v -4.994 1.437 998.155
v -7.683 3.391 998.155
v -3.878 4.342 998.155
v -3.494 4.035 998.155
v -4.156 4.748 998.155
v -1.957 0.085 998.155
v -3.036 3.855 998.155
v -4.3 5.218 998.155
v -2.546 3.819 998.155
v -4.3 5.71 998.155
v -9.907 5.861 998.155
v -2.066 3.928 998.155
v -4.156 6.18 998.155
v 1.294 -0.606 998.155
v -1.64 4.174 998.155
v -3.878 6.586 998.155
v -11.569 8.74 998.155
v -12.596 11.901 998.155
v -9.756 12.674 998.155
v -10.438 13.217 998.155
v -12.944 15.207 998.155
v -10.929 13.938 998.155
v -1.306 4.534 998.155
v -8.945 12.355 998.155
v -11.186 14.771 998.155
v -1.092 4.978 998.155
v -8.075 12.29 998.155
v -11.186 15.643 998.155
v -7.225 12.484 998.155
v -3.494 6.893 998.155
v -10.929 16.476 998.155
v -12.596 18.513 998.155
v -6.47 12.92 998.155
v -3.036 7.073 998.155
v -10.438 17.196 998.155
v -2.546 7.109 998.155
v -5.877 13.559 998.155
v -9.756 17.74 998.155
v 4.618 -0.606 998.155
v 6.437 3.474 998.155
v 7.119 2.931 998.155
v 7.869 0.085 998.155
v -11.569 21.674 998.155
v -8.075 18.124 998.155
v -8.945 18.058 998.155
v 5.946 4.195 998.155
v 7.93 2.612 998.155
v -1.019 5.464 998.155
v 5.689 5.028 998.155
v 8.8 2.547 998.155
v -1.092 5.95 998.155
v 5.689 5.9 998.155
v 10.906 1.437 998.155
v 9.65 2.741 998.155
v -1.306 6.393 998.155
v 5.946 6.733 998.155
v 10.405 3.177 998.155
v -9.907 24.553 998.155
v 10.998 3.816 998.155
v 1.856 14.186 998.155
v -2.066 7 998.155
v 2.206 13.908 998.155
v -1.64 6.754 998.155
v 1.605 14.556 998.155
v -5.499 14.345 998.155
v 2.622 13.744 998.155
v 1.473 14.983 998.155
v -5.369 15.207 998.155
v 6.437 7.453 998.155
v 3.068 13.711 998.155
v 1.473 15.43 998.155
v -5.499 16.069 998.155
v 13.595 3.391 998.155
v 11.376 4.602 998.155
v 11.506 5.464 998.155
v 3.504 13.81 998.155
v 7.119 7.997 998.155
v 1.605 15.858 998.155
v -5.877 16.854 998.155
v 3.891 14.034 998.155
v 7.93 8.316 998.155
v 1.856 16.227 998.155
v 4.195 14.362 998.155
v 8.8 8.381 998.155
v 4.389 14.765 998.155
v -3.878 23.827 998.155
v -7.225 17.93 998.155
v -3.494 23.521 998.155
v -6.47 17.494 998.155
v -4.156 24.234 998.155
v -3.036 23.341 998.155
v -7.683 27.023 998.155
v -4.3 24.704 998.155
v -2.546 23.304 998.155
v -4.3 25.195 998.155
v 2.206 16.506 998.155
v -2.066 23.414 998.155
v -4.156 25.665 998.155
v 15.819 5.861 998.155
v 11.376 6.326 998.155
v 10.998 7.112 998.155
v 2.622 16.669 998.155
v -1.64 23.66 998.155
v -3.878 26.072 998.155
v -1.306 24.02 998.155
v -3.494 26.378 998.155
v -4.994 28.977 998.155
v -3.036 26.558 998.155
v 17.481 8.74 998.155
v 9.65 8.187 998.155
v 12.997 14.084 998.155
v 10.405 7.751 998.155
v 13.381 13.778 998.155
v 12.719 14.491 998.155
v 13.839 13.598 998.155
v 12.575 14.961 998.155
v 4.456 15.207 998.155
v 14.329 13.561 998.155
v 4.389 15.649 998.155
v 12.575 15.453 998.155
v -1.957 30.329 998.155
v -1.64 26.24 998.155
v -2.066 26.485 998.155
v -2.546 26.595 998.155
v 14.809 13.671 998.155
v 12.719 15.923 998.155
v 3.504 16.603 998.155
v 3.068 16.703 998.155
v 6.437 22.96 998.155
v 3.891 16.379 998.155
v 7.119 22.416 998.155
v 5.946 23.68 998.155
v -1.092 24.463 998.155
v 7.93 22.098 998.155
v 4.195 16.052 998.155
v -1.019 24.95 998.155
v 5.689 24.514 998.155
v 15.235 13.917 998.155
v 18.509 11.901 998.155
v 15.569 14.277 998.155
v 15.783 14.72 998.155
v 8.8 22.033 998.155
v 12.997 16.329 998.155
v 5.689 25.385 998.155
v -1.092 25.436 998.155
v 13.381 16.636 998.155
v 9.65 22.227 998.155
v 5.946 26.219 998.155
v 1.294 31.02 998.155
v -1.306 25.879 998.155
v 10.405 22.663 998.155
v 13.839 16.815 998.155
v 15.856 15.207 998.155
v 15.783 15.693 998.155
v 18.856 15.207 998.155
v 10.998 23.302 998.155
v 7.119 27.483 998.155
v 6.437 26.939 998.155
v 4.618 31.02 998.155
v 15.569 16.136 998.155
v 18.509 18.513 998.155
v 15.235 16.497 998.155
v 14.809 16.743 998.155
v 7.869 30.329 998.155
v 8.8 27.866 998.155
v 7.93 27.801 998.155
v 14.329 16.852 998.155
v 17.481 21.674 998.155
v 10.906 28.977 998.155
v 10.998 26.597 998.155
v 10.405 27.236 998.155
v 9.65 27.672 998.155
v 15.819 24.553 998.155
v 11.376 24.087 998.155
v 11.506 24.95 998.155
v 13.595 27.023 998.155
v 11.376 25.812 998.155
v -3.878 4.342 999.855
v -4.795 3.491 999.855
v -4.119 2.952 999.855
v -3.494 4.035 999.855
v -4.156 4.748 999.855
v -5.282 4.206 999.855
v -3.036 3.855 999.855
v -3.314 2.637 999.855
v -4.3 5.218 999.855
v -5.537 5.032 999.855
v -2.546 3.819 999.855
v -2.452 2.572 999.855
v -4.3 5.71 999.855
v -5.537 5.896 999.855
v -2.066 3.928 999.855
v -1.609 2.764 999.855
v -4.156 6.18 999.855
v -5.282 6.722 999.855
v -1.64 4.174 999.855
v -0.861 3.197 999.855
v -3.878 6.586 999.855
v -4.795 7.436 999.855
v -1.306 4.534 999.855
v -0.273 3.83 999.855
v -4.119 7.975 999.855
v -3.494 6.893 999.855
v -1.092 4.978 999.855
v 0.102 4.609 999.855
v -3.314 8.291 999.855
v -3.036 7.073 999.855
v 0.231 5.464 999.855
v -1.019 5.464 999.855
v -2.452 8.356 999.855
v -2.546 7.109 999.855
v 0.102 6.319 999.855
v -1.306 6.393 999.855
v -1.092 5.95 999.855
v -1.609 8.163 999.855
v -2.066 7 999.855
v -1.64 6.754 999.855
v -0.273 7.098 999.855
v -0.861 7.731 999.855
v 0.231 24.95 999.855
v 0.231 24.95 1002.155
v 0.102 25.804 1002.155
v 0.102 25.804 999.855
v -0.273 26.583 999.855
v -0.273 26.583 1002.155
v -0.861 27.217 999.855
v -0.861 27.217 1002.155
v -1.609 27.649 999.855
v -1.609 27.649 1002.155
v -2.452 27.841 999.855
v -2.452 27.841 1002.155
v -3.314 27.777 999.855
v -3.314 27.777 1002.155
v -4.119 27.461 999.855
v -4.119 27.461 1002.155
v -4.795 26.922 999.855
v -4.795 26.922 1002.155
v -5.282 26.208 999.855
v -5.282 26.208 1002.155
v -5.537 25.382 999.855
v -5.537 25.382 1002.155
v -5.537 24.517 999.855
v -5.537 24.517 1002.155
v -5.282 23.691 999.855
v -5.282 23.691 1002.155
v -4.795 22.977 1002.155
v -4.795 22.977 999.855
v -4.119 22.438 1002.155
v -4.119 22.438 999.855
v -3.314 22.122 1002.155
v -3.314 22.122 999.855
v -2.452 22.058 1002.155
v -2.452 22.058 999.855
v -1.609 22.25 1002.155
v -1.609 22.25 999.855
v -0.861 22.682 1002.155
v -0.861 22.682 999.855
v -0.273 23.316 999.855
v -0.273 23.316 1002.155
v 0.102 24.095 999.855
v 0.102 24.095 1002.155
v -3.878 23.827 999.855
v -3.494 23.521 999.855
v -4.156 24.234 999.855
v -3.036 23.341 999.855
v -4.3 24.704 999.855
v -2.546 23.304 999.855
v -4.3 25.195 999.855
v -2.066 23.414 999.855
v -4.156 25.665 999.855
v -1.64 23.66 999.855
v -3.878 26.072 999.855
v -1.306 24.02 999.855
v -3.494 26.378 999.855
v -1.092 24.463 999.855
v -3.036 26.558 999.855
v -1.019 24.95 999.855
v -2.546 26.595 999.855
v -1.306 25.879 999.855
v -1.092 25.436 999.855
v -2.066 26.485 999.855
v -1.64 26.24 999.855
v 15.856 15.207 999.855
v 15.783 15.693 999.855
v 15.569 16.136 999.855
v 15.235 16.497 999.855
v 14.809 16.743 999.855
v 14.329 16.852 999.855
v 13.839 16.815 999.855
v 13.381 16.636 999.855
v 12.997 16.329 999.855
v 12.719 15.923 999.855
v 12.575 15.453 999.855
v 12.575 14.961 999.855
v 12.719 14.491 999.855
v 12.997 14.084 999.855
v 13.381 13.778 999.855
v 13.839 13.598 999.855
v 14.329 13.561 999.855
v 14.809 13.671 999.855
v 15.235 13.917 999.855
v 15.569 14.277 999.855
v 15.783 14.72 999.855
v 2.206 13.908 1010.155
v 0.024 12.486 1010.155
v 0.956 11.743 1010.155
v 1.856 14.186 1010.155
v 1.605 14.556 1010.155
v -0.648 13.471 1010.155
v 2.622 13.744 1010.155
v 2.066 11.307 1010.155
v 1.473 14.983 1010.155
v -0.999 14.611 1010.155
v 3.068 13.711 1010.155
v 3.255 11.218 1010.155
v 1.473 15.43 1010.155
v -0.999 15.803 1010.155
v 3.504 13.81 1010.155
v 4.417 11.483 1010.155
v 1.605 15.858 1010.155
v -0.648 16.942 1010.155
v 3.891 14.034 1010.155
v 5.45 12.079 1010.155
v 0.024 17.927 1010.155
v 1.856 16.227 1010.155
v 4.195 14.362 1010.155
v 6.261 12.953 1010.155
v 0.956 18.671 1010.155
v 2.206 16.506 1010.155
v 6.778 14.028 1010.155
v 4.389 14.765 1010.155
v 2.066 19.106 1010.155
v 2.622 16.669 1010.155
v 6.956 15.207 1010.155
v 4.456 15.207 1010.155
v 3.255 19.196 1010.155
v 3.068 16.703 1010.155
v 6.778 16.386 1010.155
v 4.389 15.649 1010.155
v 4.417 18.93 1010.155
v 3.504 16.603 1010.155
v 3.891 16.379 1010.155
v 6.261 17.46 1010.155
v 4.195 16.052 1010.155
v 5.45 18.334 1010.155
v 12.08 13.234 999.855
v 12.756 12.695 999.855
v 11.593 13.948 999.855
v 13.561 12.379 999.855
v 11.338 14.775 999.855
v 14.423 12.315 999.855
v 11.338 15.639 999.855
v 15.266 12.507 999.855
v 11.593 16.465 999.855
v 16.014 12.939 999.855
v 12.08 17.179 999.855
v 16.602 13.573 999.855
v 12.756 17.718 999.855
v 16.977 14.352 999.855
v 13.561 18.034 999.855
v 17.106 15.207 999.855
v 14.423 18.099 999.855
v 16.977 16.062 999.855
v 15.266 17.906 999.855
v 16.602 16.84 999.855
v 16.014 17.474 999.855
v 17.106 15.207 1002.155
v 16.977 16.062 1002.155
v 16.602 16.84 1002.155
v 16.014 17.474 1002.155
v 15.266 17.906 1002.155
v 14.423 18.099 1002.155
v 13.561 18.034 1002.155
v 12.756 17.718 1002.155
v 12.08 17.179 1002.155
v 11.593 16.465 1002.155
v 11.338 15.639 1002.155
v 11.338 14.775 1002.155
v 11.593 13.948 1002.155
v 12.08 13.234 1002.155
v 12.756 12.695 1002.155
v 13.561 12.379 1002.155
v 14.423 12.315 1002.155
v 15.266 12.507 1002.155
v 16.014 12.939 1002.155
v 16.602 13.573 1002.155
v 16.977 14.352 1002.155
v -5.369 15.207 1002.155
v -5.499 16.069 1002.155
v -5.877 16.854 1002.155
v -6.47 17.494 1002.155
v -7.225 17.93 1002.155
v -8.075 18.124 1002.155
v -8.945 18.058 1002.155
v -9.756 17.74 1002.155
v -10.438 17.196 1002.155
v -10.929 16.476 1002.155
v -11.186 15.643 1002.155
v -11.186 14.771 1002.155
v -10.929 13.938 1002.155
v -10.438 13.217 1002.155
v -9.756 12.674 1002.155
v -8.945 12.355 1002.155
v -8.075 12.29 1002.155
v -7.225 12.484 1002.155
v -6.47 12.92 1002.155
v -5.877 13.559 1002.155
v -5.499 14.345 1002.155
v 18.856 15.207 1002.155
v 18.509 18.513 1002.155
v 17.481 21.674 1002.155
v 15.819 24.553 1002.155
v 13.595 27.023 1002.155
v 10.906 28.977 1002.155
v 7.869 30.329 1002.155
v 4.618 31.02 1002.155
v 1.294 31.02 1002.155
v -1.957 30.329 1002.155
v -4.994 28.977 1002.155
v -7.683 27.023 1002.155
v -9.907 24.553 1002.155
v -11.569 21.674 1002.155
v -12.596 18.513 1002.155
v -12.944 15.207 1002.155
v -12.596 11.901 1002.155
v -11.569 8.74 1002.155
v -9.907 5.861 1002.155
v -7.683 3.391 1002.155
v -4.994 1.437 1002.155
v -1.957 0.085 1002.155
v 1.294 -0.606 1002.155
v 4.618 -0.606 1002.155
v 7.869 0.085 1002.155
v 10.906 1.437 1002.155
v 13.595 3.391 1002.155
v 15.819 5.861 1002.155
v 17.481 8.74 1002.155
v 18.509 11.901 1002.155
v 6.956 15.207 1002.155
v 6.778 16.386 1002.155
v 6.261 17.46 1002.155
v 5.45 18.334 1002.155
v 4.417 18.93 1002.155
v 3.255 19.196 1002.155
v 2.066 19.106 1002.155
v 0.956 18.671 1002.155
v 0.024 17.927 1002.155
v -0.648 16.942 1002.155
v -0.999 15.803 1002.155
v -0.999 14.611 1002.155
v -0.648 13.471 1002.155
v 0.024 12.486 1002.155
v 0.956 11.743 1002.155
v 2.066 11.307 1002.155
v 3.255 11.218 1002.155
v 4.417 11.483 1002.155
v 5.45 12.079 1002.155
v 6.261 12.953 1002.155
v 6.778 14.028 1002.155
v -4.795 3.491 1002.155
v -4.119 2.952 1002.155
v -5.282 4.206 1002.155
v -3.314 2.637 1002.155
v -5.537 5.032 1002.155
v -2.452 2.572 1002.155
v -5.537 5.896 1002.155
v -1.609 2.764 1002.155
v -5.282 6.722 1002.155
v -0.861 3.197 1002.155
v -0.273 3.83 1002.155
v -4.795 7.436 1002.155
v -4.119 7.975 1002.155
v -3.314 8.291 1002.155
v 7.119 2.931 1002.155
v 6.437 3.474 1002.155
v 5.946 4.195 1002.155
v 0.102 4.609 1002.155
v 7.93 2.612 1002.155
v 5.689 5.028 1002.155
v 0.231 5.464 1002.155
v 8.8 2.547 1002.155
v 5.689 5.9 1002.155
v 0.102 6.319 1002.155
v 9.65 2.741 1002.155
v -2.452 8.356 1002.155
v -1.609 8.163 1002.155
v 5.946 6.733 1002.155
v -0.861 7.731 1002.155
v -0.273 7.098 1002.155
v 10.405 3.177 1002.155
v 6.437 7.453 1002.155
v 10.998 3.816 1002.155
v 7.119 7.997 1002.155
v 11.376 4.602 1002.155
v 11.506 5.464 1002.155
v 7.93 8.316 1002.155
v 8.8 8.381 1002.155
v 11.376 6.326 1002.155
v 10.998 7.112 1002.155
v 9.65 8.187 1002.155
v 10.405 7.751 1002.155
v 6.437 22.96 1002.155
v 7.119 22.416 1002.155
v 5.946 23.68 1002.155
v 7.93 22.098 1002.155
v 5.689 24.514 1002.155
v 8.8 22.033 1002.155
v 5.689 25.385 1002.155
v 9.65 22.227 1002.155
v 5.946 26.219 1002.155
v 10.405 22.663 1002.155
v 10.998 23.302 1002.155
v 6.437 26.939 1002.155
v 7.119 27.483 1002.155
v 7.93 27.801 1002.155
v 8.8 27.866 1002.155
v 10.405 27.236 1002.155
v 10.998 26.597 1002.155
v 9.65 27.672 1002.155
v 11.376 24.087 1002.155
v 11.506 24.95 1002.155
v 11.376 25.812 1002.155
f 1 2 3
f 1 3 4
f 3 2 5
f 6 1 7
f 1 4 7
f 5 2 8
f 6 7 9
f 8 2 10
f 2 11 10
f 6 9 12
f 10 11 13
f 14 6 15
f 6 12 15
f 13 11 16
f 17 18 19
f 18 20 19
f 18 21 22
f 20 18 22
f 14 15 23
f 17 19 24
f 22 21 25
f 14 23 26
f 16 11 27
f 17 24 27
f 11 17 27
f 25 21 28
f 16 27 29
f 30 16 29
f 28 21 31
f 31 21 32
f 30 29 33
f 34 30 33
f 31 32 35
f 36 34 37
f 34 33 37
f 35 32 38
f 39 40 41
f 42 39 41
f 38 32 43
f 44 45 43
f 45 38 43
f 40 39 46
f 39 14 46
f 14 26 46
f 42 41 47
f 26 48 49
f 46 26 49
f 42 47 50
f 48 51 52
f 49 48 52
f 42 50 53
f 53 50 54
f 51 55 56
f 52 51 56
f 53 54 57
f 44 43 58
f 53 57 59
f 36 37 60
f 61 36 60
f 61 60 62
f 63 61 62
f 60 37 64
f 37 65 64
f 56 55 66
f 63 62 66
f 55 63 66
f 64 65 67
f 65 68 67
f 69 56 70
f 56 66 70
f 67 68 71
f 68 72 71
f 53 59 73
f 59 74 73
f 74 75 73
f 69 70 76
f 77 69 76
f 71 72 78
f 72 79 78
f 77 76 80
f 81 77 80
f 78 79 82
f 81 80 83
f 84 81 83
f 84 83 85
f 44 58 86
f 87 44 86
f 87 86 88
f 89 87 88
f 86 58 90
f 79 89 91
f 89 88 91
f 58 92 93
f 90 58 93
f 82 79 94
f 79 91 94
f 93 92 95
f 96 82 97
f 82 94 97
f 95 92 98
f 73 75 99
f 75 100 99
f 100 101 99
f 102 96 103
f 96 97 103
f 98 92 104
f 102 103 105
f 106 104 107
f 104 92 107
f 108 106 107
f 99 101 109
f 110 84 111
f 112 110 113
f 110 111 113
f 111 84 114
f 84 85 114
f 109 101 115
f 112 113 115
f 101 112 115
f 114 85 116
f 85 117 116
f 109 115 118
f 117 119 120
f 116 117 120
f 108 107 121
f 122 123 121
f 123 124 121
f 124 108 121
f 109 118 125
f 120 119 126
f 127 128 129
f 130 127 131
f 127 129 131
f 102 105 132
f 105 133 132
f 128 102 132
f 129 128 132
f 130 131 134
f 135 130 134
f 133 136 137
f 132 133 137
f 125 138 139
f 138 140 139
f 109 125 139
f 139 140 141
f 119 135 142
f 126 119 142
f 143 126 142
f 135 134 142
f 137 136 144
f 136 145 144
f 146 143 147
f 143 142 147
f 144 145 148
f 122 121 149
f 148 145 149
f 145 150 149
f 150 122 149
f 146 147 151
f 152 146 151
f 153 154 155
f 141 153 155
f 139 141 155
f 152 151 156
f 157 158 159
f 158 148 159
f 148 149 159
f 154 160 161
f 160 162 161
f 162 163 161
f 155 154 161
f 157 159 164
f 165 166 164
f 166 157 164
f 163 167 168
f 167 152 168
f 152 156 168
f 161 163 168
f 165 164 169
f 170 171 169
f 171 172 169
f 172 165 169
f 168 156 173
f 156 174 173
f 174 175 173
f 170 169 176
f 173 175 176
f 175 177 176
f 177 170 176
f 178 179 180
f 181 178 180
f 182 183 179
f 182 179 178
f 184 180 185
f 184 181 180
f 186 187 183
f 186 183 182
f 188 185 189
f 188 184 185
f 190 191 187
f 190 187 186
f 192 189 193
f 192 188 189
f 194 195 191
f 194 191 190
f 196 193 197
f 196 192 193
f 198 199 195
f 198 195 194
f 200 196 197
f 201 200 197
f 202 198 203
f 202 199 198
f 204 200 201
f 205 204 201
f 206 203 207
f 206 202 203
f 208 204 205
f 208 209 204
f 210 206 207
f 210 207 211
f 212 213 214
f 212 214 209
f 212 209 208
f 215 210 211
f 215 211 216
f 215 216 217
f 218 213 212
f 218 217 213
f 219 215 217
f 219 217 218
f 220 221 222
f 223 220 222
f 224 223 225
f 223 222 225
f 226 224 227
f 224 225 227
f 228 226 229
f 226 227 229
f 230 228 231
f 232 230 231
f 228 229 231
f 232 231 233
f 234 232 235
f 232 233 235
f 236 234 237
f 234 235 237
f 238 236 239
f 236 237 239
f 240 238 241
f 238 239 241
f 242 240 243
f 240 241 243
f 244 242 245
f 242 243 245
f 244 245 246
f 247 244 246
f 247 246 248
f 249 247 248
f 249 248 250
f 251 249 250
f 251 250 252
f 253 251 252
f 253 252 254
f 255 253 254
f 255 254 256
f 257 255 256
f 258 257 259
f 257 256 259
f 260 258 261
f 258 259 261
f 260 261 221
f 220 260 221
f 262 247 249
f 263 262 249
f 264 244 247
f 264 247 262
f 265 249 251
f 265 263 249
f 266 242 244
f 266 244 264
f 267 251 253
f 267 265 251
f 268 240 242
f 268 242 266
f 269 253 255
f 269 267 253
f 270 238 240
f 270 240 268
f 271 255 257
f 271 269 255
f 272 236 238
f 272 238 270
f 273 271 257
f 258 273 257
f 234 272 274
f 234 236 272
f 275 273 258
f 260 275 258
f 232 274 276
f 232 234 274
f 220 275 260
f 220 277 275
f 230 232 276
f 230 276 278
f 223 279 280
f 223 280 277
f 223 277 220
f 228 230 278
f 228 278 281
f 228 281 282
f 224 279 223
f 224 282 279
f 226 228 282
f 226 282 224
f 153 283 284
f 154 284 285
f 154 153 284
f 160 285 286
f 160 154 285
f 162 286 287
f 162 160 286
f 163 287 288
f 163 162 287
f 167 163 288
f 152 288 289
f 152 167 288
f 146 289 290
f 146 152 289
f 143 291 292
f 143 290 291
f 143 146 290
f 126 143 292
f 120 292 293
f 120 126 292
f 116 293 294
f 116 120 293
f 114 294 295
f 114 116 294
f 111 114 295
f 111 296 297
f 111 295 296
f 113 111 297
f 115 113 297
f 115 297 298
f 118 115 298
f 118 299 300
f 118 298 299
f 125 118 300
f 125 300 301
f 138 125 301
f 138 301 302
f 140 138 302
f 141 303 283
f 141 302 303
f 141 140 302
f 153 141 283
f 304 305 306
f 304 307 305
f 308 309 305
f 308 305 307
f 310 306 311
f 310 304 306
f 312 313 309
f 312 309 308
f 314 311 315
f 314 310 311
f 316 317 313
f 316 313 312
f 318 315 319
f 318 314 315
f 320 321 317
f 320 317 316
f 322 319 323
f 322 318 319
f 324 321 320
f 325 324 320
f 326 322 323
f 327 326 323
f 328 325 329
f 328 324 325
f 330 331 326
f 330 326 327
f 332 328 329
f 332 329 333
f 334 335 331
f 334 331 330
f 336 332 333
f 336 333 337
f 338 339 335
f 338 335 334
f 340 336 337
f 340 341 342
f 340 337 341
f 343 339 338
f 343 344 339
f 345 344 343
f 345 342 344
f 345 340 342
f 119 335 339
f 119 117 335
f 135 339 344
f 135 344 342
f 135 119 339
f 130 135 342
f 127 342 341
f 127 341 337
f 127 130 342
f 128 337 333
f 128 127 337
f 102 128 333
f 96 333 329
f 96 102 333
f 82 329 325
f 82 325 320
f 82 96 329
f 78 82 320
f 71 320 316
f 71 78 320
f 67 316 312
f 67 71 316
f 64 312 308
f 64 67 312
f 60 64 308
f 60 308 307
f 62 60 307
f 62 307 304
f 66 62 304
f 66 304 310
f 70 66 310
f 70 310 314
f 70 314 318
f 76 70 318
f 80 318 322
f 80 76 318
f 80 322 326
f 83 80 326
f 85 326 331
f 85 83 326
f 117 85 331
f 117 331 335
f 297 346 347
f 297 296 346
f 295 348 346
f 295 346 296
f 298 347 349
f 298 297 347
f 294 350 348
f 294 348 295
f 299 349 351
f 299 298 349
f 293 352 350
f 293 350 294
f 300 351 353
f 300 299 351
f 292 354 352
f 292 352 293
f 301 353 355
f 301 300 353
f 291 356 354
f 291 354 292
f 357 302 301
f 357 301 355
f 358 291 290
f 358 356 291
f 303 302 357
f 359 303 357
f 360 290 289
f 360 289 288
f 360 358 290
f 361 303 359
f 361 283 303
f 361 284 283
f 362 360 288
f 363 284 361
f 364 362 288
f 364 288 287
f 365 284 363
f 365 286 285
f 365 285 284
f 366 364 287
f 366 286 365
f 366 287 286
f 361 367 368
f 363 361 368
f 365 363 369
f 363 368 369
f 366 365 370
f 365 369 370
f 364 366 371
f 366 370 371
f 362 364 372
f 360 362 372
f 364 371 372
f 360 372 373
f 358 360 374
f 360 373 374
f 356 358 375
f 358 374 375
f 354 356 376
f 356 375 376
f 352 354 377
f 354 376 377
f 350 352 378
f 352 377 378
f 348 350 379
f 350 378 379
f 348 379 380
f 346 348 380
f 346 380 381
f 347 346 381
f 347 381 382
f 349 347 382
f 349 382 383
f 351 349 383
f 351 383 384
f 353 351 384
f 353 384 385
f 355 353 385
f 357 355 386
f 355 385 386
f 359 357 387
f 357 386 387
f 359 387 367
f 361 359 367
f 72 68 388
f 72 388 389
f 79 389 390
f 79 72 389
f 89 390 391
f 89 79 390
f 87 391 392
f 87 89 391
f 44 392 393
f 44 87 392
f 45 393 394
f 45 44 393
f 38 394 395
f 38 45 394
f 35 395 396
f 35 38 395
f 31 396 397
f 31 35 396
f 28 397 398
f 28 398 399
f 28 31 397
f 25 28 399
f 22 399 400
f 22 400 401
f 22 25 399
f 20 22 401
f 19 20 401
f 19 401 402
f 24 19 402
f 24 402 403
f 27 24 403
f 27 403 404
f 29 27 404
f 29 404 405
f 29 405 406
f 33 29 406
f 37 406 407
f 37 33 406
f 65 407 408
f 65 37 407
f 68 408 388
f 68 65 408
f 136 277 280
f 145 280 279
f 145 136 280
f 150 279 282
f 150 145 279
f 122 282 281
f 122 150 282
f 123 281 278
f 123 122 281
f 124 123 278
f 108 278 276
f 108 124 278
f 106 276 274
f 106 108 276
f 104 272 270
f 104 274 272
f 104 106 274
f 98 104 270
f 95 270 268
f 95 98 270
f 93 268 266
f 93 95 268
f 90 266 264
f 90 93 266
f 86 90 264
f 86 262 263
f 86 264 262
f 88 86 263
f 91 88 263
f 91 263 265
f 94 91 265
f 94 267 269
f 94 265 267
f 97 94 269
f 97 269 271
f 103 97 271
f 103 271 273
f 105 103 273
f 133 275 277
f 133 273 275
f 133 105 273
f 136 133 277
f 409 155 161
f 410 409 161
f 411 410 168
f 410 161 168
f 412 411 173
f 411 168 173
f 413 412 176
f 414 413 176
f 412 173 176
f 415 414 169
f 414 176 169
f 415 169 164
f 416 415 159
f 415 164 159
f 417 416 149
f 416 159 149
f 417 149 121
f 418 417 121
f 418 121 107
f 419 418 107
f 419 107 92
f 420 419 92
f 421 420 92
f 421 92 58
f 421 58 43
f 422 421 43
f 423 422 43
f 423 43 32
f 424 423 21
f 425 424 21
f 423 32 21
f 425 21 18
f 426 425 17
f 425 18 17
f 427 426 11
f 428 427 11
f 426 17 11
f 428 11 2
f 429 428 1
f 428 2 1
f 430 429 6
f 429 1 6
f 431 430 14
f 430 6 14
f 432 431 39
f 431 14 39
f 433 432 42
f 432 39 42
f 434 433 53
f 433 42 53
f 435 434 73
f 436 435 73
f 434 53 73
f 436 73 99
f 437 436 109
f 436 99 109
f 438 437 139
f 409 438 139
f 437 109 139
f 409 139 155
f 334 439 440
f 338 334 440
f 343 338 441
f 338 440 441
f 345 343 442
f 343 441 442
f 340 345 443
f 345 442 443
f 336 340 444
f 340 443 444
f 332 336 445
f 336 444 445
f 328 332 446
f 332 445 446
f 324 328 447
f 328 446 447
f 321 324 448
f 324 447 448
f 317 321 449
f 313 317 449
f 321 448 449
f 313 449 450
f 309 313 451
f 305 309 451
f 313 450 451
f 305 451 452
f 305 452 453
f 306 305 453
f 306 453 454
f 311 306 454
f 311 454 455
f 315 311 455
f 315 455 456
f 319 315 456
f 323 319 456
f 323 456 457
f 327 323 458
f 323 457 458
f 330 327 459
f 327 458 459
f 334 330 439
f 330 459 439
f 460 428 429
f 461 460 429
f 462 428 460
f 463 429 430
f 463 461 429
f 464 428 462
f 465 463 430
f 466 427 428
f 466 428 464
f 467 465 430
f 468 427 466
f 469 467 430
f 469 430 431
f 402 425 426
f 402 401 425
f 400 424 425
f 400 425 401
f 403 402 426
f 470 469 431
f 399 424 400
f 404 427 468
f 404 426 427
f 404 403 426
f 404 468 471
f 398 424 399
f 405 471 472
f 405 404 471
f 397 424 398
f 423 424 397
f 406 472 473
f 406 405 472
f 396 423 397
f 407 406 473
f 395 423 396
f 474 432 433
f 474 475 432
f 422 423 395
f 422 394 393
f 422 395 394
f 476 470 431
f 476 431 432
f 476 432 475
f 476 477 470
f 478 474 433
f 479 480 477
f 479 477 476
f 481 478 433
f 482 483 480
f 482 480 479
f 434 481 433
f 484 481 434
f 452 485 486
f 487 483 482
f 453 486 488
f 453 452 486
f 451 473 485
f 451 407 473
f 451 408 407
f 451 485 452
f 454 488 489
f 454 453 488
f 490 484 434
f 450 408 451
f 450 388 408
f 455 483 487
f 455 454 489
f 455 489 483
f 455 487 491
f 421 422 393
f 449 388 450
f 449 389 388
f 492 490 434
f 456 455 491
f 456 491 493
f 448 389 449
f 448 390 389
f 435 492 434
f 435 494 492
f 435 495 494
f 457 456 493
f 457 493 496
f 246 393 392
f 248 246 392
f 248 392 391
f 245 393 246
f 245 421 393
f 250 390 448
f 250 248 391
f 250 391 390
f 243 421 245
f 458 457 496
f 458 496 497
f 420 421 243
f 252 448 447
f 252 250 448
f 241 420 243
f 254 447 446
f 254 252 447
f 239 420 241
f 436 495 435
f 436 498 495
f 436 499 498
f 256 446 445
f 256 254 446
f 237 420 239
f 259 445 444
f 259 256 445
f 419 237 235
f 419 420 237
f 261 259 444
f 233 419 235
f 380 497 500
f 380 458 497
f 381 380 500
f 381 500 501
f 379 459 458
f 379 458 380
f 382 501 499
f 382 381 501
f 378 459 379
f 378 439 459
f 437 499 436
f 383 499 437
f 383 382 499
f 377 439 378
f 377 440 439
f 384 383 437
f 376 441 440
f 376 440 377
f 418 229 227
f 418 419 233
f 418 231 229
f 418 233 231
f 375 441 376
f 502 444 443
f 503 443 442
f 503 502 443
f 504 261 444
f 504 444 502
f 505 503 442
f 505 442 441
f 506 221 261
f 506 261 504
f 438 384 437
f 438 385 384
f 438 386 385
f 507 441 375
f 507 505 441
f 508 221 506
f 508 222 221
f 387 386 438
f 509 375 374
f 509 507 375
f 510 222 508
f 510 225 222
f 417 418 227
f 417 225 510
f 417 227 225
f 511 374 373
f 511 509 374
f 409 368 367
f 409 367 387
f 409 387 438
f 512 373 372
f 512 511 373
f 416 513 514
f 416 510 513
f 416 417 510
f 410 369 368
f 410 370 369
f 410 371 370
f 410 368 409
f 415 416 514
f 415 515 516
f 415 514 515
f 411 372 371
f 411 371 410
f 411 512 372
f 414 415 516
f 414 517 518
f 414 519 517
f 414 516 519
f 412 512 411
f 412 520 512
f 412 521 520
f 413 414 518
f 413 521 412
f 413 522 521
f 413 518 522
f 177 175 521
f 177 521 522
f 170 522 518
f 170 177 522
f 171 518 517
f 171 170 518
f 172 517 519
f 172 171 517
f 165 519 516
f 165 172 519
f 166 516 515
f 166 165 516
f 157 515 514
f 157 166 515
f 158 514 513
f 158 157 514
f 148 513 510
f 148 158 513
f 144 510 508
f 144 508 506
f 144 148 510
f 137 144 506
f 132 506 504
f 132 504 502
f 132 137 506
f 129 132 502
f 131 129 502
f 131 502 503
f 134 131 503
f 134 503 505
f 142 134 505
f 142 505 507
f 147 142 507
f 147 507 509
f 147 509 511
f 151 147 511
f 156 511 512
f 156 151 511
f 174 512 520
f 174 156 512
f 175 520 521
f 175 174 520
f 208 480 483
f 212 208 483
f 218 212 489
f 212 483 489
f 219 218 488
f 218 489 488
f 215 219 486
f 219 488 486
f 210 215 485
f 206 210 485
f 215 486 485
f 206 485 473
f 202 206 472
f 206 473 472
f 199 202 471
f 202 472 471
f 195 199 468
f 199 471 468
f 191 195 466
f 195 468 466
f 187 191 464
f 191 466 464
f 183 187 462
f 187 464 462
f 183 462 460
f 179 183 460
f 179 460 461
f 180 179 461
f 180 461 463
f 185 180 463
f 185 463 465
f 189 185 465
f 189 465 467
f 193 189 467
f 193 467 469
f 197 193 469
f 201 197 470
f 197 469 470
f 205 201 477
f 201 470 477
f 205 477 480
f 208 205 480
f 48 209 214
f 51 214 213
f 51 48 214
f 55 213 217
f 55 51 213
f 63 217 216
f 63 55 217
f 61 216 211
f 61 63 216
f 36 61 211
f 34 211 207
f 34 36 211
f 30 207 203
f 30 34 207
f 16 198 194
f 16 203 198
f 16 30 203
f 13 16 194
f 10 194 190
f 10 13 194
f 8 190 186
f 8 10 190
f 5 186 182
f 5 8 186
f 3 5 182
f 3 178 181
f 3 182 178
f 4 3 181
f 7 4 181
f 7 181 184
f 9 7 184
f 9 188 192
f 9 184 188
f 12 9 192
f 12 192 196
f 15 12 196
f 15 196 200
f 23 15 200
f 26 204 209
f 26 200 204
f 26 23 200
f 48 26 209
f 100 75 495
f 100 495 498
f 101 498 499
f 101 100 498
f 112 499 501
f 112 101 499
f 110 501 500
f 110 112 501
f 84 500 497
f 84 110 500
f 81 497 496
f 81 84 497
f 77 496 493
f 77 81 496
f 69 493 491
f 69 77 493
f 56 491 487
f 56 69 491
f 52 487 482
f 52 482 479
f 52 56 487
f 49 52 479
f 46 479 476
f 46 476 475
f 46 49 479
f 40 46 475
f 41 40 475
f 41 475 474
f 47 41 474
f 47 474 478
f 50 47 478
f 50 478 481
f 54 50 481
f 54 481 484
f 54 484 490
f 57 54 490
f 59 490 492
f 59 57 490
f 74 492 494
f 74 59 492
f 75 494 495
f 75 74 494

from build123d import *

# Parameters (mm, degrees)
CROQUIS1_R              = 15.9
CROQUIS1_R_2            = 2.925
CROQUIS1_R_3            = 1.65
CROQUIS1_R_4            = 1.5
SALIENTE_EXTRUIR1_DEPTH = 4
CROQUIS3_R              = 4
CROQUIS3_R_2            = 1.5
SALIENTE_EXTRUIR3_DEPTH = 8
CROQUIS4_R              = 2.9
CORTAR_EXTRUIR2_DEPTH   = 2.3


with BuildPart() as part:
    # Croquis1 → Saliente-Extruir1 (new body)
    with BuildSketch(Plane.XY.offset(998.15499802)):
        with Locations((2.956072514, 15.206748875)):
            Circle(CROQUIS1_R)
        with Locations((-8.293927486, 15.206748875)):
            Circle(CROQUIS1_R_2, mode=Mode.SUBTRACT)
        with Locations((14.206072514, 15.206748875)):
            Circle(CROQUIS1_R_3, mode=Mode.SUBTRACT)
        with Locations((-2.668927486, 5.463963082)):
            Circle(CROQUIS1_R_3, mode=Mode.SUBTRACT)
        with Locations((-2.668927486, 24.949534667)):
            Circle(CROQUIS1_R_3, mode=Mode.SUBTRACT)
        with Locations((8.581072514, 24.949534667)):
            Circle(CROQUIS1_R_2, mode=Mode.SUBTRACT)
        with Locations((2.956072514, 15.206748875)):
            Circle(CROQUIS1_R_4, mode=Mode.SUBTRACT)
        with Locations((8.581072514, 5.463963082)):
            Circle(CROQUIS1_R_2, mode=Mode.SUBTRACT)
    extrude(amount=SALIENTE_EXTRUIR1_DEPTH)

    # Croquis3 → Saliente-Extruir3 (add)
    with BuildSketch(Plane.XY.offset(1002.15499802)):
        with Locations((2.956072514, 15.206748875)):
            Circle(CROQUIS3_R)
        with Locations((2.956072514, 15.206748875)):
            Circle(CROQUIS3_R_2, mode=Mode.SUBTRACT)
    extrude(amount=SALIENTE_EXTRUIR3_DEPTH)

    # Croquis4 → Cortar-Extruir2 (cut)
    with BuildSketch(Plane.XY.offset(1002.15499802)):
        with Locations((-2.668927486, 24.949534667)):
            Circle(CROQUIS4_R)
        with Locations((14.206072514, 15.206748875)):
            Circle(CROQUIS4_R)
        with Locations((-2.668927486, 5.463963082)):
            Circle(CROQUIS4_R)
    extrude(amount=-CORTAR_EXTRUIR2_DEPTH, mode=Mode.SUBTRACT)


solid = part.part
